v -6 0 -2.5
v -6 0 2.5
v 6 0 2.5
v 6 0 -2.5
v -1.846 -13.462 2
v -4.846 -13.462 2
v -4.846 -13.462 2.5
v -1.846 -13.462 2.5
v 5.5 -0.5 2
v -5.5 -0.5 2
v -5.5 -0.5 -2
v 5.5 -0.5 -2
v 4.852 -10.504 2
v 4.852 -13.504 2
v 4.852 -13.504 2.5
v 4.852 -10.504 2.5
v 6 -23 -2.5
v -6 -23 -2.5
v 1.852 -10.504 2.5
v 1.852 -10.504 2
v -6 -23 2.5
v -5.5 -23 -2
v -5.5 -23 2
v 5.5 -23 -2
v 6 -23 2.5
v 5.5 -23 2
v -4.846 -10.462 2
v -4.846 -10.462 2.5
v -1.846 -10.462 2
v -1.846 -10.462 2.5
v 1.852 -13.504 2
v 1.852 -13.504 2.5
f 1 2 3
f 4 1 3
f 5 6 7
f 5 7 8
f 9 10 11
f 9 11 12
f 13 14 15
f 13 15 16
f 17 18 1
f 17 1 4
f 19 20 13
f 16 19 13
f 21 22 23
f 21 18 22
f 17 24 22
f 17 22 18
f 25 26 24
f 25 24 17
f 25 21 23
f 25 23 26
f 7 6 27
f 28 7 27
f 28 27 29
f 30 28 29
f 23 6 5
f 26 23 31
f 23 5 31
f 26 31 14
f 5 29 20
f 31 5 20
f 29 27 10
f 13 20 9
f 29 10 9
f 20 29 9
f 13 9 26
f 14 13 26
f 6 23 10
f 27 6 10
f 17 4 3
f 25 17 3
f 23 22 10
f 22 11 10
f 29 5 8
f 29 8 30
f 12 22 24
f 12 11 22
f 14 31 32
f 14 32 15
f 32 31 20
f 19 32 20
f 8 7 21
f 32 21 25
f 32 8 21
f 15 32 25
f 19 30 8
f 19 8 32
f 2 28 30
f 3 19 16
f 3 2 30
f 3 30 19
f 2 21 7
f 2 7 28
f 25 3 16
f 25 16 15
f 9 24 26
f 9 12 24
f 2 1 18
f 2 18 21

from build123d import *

# Parameters (mm, degrees)
F0_W     = 12
F0_H     = 5
F1_DEPTH = 23
F2_T     = -0.5
F3_W     = 3
F3_H     = 3
F4_DEPTH = 4.2
F5_W     = 3
F5_H     = 3
F6_DEPTH = 6.2


with BuildPart() as f1:
    # F0 (on Front) → F1 (new body)
    with BuildSketch(Plane.XZ):
        Rectangle(F0_W, F0_H)
    extrude(amount=F1_DEPTH)

    # F2
    f2_openings = [f1.faces().sort_by_distance(p)[0] for p in [
        (0, -23, 0),
    ]]
    offset(amount=F2_T, openings=f2_openings)

    # F3 (on Top) → F4 (cut)
    with BuildSketch(Plane.XY):
        with Locations((-3.345713, -11.96193)):
            Rectangle(F3_W, F3_H)
    extrude(amount=F4_DEPTH, mode=Mode.SUBTRACT)

    # F5 (on Top) → F6 (cut)
    with BuildSketch(Plane.XY):
        with Locations((3.351791, -12.00388)):
            Rectangle(F5_W, F5_H)
    extrude(amount=F6_DEPTH, mode=Mode.SUBTRACT)


solid = f1.part
